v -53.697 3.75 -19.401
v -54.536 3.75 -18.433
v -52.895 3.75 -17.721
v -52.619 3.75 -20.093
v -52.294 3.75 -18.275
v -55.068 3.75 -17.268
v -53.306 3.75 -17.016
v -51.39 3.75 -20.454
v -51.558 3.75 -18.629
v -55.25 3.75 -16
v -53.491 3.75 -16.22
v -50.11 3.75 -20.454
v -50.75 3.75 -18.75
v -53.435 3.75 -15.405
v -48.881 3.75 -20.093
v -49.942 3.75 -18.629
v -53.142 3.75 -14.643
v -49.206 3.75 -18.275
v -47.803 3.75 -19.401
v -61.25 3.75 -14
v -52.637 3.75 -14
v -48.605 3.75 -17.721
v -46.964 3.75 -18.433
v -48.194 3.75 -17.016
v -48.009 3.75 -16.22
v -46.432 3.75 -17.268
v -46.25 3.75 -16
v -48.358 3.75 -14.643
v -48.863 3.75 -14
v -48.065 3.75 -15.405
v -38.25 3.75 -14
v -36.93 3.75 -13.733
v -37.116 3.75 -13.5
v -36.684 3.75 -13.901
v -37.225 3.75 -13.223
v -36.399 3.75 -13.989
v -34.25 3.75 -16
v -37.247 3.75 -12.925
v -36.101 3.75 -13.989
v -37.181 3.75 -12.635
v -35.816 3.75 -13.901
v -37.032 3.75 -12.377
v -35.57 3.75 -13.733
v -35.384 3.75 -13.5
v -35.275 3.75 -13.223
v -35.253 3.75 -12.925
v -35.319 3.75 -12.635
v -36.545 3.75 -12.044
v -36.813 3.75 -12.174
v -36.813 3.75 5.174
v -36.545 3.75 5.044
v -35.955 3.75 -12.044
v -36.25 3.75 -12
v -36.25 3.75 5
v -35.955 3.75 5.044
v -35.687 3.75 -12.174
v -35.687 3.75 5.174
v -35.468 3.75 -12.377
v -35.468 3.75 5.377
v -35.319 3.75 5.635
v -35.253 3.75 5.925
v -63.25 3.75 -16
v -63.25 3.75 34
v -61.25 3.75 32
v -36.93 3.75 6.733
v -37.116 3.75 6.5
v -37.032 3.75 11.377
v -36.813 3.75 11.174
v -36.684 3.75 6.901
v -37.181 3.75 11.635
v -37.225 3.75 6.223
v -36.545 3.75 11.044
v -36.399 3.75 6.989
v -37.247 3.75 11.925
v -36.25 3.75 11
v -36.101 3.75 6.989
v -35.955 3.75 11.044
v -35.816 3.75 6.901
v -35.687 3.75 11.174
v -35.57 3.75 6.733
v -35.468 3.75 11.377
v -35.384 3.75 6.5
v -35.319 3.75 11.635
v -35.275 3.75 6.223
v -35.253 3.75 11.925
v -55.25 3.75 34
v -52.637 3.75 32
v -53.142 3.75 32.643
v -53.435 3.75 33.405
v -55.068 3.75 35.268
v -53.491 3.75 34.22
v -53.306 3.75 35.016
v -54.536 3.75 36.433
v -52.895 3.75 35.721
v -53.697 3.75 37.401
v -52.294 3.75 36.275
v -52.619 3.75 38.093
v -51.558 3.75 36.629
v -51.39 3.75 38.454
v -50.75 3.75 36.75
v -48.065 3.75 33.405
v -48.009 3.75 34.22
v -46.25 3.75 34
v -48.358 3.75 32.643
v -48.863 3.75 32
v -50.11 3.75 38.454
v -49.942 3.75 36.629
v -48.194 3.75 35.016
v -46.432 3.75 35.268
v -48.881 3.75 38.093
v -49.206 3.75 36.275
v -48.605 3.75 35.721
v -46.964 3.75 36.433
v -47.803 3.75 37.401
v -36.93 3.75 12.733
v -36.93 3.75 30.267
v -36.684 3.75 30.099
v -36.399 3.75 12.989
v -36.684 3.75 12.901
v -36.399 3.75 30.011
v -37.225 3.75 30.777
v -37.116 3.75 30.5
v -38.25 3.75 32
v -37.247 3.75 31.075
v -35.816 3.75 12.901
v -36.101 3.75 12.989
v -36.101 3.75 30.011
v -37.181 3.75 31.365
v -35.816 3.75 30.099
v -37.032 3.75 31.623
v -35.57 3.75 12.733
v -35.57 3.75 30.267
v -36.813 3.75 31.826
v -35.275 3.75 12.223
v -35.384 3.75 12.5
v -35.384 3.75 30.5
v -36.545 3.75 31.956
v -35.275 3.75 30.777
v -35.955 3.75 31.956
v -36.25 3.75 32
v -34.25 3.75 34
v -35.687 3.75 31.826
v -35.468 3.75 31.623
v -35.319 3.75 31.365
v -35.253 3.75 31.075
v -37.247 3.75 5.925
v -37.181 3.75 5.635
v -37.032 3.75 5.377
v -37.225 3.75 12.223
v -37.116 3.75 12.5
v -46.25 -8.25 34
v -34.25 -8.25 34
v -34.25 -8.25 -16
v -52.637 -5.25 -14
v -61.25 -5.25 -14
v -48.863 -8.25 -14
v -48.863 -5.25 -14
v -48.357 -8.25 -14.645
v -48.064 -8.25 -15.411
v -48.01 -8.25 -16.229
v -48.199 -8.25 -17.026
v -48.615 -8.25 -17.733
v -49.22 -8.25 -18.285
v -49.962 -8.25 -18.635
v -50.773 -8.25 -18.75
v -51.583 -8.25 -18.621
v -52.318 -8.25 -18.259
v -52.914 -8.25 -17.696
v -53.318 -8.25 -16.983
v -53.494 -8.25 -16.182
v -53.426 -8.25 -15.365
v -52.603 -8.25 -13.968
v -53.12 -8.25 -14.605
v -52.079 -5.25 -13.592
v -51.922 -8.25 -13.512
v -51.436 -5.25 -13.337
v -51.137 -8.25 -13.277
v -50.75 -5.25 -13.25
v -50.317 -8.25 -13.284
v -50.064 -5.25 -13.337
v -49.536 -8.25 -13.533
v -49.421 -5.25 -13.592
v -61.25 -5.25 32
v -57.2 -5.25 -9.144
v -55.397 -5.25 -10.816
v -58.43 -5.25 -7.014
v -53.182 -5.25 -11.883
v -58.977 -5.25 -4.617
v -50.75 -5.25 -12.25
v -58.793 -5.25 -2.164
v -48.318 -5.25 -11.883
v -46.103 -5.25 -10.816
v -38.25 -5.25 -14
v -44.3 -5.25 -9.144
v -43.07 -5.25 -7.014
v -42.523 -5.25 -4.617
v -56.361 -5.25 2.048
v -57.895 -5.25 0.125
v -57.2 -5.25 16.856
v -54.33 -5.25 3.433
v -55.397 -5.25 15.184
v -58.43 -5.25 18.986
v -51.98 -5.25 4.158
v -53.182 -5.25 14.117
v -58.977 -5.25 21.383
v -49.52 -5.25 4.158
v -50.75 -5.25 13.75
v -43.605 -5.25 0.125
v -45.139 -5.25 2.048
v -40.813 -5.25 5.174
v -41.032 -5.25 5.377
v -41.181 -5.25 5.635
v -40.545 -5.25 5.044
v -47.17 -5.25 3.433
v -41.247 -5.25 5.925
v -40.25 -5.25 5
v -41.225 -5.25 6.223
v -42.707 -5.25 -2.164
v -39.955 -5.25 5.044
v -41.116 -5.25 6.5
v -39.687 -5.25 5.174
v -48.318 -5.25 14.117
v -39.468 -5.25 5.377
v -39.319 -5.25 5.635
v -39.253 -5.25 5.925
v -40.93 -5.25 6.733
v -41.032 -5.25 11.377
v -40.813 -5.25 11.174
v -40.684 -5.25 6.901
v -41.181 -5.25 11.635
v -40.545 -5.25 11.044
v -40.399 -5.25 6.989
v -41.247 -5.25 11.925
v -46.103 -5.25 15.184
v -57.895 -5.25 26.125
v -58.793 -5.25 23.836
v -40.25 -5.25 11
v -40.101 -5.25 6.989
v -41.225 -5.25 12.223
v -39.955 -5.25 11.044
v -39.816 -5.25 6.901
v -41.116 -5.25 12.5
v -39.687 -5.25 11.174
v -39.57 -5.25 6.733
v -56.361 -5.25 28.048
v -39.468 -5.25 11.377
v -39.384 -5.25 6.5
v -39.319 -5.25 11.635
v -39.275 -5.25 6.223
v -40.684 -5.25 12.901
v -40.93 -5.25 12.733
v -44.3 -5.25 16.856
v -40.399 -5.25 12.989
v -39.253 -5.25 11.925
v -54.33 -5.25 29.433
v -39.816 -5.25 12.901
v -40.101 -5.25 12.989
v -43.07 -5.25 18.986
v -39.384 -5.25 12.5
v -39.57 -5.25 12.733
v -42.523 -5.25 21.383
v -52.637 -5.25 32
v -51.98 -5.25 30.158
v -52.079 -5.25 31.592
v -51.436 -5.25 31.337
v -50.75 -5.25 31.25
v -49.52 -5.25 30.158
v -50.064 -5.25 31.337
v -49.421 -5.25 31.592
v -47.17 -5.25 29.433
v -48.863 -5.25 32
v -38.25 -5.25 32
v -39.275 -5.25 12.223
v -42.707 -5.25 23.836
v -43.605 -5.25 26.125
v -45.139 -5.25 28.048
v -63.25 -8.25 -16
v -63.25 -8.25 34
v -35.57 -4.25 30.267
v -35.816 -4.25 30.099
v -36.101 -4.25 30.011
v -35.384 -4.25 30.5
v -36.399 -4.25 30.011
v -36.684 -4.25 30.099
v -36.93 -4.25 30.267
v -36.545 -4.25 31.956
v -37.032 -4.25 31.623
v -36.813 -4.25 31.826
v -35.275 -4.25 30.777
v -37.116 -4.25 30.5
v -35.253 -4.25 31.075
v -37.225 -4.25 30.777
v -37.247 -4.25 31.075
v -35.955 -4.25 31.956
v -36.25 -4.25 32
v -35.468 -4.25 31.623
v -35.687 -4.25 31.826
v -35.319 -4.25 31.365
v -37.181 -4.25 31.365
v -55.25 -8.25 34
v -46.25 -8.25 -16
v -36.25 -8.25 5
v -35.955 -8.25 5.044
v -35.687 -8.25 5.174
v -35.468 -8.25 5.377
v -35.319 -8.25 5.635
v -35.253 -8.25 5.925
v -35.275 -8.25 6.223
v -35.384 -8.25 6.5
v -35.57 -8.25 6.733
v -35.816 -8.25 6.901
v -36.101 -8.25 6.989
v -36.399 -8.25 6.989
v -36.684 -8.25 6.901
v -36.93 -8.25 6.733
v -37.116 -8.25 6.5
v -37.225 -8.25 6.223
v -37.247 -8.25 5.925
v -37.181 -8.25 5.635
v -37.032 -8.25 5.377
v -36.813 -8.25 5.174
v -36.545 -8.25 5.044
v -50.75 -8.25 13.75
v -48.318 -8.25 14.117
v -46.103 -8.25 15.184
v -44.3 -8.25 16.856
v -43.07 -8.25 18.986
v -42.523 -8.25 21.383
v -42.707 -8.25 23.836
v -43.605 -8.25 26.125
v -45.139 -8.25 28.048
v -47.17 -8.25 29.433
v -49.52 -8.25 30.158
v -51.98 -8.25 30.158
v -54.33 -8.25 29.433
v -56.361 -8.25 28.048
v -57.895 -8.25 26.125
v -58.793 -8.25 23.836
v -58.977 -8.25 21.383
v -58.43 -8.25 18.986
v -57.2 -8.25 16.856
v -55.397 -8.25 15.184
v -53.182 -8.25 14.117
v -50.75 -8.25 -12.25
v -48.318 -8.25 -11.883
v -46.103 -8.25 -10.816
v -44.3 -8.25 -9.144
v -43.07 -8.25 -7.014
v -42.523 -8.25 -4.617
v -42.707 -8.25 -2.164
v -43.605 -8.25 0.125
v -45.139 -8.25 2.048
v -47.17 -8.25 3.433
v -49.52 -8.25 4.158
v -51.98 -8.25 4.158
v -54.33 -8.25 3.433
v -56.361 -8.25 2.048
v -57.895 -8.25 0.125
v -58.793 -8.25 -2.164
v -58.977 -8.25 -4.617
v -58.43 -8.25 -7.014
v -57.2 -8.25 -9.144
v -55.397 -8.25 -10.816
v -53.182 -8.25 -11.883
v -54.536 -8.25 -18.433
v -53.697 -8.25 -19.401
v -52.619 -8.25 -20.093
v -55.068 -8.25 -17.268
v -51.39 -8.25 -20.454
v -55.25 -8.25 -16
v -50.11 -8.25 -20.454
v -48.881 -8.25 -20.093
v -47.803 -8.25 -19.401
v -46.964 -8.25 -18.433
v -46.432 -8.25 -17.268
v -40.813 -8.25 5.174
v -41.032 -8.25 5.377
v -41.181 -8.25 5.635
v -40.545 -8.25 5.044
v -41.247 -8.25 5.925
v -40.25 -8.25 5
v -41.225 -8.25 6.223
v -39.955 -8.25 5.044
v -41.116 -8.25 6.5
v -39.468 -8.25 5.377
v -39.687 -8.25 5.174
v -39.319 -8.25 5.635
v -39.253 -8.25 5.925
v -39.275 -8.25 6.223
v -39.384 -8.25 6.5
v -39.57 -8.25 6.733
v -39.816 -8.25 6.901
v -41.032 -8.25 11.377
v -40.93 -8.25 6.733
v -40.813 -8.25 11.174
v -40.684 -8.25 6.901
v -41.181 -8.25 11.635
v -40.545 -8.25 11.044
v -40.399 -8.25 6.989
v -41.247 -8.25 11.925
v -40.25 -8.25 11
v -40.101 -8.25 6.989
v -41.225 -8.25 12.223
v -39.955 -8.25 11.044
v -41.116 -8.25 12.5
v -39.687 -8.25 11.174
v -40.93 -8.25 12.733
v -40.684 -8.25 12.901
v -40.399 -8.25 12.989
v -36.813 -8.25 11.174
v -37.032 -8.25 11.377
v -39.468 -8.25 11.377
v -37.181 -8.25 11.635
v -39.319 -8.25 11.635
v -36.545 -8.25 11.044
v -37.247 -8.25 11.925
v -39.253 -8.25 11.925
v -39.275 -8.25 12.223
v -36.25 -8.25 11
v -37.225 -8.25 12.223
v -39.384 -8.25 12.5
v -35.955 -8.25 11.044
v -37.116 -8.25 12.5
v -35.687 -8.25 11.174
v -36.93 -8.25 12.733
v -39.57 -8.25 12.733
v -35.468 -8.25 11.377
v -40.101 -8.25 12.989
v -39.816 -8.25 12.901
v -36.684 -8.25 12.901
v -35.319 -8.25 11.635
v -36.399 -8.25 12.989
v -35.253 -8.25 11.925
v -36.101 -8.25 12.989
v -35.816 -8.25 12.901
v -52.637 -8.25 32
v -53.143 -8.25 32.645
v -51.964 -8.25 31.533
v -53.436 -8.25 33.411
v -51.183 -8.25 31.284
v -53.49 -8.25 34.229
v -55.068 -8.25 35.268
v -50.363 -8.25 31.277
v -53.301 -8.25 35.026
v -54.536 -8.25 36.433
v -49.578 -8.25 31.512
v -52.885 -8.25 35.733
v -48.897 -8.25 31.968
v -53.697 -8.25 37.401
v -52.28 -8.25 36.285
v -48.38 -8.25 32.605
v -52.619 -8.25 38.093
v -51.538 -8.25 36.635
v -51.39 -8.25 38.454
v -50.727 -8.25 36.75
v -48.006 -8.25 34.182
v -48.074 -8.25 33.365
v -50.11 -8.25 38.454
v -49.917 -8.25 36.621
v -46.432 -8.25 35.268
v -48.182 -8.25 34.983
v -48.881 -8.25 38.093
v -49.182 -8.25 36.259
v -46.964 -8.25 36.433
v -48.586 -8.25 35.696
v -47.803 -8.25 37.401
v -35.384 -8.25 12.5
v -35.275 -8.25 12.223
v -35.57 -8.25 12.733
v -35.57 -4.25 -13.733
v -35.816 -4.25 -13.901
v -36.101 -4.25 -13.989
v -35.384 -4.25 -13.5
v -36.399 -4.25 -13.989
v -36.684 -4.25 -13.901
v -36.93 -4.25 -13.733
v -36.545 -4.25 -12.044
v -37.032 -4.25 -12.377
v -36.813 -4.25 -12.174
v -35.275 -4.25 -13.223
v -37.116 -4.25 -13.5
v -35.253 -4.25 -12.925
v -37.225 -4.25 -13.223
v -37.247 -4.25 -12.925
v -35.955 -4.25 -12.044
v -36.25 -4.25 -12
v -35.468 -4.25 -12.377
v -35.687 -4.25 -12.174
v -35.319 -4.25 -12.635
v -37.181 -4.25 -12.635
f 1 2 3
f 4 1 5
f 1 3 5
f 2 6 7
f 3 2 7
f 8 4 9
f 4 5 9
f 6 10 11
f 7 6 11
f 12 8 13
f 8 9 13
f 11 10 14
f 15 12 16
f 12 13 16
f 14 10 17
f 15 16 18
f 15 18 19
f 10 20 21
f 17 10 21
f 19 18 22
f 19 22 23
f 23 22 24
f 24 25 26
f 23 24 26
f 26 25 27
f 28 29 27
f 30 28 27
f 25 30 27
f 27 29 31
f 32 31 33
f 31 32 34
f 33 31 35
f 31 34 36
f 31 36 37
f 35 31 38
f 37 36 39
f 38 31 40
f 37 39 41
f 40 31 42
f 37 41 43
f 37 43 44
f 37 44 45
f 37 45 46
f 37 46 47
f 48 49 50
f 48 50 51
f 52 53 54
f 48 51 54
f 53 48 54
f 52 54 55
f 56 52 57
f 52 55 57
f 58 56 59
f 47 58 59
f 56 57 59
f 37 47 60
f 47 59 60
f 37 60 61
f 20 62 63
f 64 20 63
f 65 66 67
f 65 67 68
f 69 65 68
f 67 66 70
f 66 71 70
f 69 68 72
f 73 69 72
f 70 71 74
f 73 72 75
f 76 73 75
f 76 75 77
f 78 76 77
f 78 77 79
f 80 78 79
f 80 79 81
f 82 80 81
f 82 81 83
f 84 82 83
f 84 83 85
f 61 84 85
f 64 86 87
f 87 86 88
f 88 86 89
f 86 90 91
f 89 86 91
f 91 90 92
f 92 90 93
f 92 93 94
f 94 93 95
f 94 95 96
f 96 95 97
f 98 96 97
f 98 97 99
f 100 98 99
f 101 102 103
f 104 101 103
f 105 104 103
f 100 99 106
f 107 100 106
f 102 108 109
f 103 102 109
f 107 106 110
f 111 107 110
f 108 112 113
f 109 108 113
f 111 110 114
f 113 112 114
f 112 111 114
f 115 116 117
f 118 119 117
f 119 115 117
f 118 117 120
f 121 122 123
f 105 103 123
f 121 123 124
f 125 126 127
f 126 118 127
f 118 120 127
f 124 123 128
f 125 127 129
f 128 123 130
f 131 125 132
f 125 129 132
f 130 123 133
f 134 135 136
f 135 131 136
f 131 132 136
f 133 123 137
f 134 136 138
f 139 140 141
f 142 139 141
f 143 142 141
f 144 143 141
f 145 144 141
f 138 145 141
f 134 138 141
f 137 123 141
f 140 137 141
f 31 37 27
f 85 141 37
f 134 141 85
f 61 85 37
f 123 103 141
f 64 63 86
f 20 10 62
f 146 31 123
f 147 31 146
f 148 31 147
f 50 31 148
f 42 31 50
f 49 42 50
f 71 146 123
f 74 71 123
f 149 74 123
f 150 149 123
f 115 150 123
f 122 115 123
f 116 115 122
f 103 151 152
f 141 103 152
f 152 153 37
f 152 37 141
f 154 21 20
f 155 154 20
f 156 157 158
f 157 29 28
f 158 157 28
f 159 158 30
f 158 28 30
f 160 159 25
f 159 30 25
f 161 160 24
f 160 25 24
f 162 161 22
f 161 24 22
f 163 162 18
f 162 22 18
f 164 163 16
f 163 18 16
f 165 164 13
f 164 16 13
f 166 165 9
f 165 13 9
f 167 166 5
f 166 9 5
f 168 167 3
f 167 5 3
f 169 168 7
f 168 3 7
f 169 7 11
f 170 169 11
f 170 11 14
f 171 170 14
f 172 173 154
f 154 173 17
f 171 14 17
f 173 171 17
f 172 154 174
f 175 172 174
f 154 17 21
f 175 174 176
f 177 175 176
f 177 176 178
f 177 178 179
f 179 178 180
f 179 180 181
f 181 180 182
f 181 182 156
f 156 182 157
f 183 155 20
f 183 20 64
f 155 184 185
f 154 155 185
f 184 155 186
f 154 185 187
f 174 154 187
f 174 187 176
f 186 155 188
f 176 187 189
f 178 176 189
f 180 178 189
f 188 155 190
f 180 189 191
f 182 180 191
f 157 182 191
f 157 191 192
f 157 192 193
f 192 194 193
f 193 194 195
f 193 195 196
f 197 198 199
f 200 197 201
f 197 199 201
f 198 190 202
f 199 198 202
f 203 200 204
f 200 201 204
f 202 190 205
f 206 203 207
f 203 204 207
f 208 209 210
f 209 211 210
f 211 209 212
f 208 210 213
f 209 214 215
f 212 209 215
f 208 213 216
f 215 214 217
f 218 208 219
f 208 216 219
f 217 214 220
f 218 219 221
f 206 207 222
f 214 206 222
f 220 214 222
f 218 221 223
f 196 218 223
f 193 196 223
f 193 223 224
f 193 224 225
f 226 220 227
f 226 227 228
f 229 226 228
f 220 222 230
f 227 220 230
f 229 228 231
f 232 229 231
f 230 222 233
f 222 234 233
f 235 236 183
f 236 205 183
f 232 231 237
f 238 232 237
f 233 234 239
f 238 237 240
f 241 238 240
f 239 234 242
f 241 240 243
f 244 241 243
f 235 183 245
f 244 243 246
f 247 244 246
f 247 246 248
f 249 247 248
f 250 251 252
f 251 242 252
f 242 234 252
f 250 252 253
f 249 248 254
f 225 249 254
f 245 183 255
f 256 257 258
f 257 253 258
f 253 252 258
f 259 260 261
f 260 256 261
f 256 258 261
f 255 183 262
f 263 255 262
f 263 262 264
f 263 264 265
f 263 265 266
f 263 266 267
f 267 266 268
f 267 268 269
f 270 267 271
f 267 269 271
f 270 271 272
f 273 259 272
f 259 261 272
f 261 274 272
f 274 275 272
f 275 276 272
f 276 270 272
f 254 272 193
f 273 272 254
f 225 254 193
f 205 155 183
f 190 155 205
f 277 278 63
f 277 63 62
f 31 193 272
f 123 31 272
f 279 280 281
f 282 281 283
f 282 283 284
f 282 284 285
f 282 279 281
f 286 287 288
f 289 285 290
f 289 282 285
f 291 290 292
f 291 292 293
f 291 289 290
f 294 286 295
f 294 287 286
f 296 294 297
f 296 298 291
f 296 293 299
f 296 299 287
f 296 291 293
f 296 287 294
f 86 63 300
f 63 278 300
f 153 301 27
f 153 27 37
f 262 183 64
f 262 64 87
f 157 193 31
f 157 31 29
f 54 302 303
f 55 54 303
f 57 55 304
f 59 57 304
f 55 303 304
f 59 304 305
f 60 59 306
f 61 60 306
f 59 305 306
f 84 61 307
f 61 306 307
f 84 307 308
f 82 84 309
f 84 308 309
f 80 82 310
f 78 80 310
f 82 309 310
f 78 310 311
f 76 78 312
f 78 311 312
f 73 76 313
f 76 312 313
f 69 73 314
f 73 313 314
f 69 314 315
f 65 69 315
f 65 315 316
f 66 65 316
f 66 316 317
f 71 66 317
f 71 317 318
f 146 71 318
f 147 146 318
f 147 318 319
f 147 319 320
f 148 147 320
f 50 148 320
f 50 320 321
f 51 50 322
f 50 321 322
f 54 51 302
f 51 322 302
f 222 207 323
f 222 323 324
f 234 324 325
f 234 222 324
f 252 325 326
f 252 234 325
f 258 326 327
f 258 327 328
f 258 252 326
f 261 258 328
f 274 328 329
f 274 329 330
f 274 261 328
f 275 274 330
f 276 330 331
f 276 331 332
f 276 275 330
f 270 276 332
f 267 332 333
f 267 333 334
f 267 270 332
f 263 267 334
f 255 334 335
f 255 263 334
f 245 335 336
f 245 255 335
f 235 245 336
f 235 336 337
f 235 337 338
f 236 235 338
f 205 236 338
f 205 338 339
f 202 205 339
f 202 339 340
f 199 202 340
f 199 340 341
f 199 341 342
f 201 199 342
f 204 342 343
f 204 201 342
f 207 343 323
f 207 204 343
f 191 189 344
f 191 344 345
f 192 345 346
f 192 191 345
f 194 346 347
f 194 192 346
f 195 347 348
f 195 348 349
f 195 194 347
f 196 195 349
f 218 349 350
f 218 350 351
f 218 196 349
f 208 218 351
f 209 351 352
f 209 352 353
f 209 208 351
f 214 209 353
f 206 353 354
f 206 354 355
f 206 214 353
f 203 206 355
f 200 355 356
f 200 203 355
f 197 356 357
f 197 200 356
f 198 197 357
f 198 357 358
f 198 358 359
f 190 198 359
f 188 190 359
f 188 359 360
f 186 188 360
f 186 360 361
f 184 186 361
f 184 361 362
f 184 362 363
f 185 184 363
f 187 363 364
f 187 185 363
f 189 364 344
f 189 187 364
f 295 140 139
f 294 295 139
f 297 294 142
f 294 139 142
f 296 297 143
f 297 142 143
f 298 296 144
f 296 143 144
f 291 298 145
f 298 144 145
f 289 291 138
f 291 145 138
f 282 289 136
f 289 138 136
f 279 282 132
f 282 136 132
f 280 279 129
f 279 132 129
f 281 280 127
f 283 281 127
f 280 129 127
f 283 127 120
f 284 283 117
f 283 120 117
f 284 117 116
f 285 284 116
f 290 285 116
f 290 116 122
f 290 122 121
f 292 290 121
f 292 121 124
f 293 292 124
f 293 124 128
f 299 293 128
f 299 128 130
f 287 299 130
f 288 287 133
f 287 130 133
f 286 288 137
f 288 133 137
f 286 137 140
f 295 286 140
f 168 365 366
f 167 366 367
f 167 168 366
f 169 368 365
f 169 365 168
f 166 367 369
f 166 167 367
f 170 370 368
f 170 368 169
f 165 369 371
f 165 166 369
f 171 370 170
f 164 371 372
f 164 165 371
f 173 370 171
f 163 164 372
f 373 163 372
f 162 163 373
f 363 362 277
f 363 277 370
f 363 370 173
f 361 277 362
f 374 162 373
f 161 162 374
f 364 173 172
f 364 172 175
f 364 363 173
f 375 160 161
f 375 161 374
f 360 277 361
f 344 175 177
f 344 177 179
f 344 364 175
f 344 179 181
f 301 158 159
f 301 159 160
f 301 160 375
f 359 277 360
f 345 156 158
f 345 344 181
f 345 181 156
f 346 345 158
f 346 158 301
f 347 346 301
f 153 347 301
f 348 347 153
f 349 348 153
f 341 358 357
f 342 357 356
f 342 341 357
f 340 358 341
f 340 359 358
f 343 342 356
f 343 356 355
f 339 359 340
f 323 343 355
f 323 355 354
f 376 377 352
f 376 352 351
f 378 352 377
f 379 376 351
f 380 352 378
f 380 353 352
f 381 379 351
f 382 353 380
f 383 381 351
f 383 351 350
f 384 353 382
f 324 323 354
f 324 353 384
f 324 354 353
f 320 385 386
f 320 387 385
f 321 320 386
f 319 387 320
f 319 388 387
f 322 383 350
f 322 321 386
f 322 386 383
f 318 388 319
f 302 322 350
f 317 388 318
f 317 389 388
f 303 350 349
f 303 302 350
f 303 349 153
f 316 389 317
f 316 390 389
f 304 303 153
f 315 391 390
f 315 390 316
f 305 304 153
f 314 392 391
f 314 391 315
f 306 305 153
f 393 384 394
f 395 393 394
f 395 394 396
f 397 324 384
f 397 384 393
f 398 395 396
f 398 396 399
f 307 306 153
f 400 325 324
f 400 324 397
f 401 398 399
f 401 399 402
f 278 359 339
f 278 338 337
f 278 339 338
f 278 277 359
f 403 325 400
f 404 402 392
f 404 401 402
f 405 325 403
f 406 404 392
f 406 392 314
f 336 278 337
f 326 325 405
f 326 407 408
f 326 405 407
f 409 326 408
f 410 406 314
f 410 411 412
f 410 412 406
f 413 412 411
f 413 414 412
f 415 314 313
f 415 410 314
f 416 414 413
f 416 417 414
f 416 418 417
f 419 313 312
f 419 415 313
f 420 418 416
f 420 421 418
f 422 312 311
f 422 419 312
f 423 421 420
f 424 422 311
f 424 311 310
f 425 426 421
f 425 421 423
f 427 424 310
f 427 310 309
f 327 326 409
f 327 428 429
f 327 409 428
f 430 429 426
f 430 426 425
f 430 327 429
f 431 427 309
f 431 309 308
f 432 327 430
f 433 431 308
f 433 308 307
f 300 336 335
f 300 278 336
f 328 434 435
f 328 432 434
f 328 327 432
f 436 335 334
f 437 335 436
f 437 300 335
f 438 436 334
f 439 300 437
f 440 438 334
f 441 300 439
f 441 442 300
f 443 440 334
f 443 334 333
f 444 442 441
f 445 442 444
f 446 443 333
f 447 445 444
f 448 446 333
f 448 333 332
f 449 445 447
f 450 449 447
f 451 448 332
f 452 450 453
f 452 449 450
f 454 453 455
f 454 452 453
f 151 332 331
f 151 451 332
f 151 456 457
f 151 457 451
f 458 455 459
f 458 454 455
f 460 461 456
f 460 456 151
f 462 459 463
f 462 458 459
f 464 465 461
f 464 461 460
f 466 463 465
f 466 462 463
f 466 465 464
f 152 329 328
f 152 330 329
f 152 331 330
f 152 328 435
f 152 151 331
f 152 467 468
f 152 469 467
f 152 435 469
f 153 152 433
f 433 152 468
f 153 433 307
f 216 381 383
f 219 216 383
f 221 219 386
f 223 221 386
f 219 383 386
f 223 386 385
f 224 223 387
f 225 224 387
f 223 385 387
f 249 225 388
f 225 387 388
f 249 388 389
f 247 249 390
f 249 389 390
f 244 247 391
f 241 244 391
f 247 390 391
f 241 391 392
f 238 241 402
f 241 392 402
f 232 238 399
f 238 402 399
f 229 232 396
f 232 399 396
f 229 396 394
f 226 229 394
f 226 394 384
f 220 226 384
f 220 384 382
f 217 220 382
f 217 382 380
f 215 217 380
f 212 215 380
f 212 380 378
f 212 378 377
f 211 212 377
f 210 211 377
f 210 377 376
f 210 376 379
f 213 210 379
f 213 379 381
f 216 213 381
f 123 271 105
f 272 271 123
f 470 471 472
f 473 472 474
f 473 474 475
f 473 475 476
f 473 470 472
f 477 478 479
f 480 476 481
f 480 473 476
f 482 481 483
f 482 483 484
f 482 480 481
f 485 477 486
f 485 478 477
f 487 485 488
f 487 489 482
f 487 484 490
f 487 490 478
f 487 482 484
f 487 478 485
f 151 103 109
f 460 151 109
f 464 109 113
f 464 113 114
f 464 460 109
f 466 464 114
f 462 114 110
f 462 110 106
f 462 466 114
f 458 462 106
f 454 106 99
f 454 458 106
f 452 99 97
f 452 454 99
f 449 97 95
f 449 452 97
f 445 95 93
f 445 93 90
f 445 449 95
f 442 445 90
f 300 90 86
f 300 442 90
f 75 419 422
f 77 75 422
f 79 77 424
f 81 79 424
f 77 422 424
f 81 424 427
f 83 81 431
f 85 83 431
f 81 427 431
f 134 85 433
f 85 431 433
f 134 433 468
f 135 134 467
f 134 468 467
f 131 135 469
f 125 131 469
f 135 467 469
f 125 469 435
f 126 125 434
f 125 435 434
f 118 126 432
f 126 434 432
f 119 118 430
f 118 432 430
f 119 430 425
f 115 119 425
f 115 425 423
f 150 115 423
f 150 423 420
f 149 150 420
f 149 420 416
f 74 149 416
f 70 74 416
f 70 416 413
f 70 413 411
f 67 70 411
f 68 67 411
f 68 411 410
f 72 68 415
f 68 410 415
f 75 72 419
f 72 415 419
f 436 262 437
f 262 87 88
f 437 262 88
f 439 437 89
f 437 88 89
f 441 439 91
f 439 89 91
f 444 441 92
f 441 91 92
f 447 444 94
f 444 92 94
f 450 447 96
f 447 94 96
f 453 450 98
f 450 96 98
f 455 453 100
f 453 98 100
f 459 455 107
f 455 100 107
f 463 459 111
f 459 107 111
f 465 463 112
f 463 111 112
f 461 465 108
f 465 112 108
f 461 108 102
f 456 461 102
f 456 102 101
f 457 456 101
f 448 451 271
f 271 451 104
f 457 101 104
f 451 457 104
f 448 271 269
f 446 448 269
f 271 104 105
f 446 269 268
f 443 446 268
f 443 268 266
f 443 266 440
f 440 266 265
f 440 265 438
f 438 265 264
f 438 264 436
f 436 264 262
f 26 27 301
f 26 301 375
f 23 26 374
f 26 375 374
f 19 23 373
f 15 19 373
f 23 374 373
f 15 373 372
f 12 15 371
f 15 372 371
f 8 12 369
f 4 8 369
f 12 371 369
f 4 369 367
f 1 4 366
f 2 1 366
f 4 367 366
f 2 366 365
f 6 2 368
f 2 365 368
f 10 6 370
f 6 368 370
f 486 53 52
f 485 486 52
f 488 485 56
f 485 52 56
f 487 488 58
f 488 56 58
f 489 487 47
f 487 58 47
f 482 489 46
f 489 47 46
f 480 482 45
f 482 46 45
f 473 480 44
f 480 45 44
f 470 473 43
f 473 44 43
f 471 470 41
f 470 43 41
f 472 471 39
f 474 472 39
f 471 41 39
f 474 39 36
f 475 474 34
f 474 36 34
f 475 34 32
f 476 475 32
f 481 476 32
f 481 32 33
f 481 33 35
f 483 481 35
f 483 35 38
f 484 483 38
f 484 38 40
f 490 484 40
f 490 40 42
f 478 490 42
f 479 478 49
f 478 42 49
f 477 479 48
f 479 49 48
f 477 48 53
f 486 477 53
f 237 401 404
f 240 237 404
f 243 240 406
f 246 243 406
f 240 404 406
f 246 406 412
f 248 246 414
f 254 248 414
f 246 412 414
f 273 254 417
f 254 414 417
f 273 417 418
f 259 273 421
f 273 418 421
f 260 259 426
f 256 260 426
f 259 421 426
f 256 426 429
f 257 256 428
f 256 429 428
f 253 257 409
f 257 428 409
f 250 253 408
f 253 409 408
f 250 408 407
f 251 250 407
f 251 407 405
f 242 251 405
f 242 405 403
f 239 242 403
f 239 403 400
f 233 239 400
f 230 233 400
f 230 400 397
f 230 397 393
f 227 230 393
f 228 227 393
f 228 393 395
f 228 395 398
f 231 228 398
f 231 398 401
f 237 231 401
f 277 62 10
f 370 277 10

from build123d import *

# Parameters (mm, degrees)
BOSS_EXTRUDE1_DEPTH      = 2
BOSS_EXTRUDE2_DEPTH      = 1
SKETCH3_R                = 1
CUT_EXTRUDE1_DEPTH       = 1
BOSS_EXTRUDE3_DEPTH      = 2
BOSS_EXTRUDE3_DEPTH_BACK = 1
BOSS_EXTRUDE4_START      = -3
BOSS_EXTRUDE4_OUTLINE_R  = 1
BOSS_EXTRUDE4_DEPTH      = 3
SKETCH6_R                = 3.500627768
BOSS_EXTRUDE5_DEPTH      = 3
BOSS_EXTRUDE6_DEPTH      = 3
CUT_EXTRUDE2_DEPTH       = 15
FILLET1_R                = 20
FILLET2_R                = 3
FILLET3_R                = 3
SKETCH9_R                = 1
CUT_EXTRUDE3_DEPTH       = 15
CUT_EXTRUDE4_DEPTH       = 1.5
FILLET4_R                = 8
FILLET5_R                = 2
SKETCH11_W               = 110.258684369
SKETCH11_H               = 6.064888907
CUT_EXTRUDE5_DEPTH       = 38
SKETCH12_R               = 18.613151801
CUT_EXTRUDE6_DEPTH       = 29
SKETCH13_W               = 77.706478895
SKETCH13_H               = 41.021519778
CUT_EXTRUDE7_DEPTH       = 1
FILLET6_START            = -4.447684996
FILLET6_DEPTH            = 2
FILLET6_START_2          = 2.447684996
FILLET6_2_DEPTH          = 2
FILLET6_START_3          = -1
FILLET6_3_DEPTH          = 1
FILLET6_START_4          = -2.447684996
FILLET6_4_DEPTH          = 4.895369992
CUT_EXTRUDE8_DEPTH       = 37
CUT_EXTRUDE8_DEPTH_BACK  = 10
SKETCH14_W               = 81.474605317
SKETCH14_H               = 77.503756956
BOSS_EXTRUDE7_DEPTH      = 2
BOSS_EXTRUDE7_DEPTH_BACK = 1
BOSS_EXTRUDE8_DEPTH      = 8
BOSS_EXTRUDE8_DEPTH_BACK = 3
SKETCH16_W               = 2
SKETCH16_H               = 10.5
BOSS_EXTRUDE9_DEPTH      = 10.5
FILLET7_R                = 10
SKETCH18_W               = 1.521986252
SKETCH18_H               = 3
BOSS_EXTRUDE10_DEPTH     = 10.5
FILLET8_R                = 2
SKETCH19_W               = 25
SKETCH19_H               = 2
BOSS_EXTRUDE11_DEPTH     = 10.5
SKETCH20_W               = 4
SKETCH20_H               = 10
SKETCH20_R               = 1
BOSS_EXTRUDE12_DEPTH     = 5
FILLET9_R                = 2
FILLET10_R               = 2
FILLET11_R               = 2
SKETCH21_R               = 8.25
BOSS_EXTRUDE13_DEPTH     = 3
BOSS_EXTRUDE14_START     = 3
SKETCH23_W               = 4
SKETCH23_H               = 10
SKETCH23_R               = 1
BOSS_EXTRUDE14_DEPTH     = 3
SKETCH25_R               = 50.400338574
CUT_EXTRUDE9_DEPTH       = 20
BOSS_EXTRUDE15_DEPTH     = 12
SKETCH27_W               = 4
SKETCH27_H               = 50
SKETCH27_R               = 1
BOSS_EXTRUDE16_DEPTH     = 12
SKETCH28_R               = 2.5
CUT_EXTRUDE10_DEPTH      = 18
BOSS_EXTRUDE17_DEPTH     = 12
SKETCH30_R               = 2.75
CUT_EXTRUDE11_DEPTH      = 18
SKETCH31_R               = 1
CUT_EXTRUDE12_DEPTH      = 8


with BuildPart() as part:
    # Sketch1 → Boss-Extrude1 (new body)
    with BuildSketch(Plane.XY):
        with BuildLine():
            Line((14.458185053, 3.677415528), (0.579181495, 5.217954465))
            ThreePointArc((0.579181495, 5.217954465), (-5.25, 0), (0.579181495, -5.217954465))
            Line((0.579181495, -5.217954465), (14.458185053, -3.677415528))
            ThreePointArc((14.458185053, -3.677415528), (17.75, 0), (14.458185053, 3.677415528))
        make_face()
        with BuildLine():
            Line((14.292704626, 2.186571395), (0.413701068, 3.727110332))
            ThreePointArc((0.413701068, 3.727110332), (-3.75, 0), (0.413701068, -3.727110332))
            Line((0.413701068, -3.727110332), (14.292704626, -2.186571395))
            ThreePointArc((14.292704626, -2.186571395), (16.25, 0), (14.292704626, 2.186571395))
        make_face(mode=Mode.SUBTRACT)
    extrude(amount=BOSS_EXTRUDE1_DEPTH)

    # Sketch2 → Boss-Extrude2 (add)
    with BuildSketch(Plane.XY.offset(2)):
        with BuildLine():
            Line((14.458185053, 3.677415528), (0.579181495, 5.217954465))
            ThreePointArc((0.579181495, 5.217954465), (-5.25, 0), (0.579181495, -5.217954465))
            Line((0.579181495, -5.217954465), (14.458185053, -3.677415528))
            ThreePointArc((14.458185053, -3.677415528), (17.75, 0), (14.458185053, 3.677415528))
        make_face()
    extrude(amount=BOSS_EXTRUDE2_DEPTH)

    # Sketch3 → Cut-Extrude1 (cut)
    with BuildSketch(Plane.XY.offset(3)):
        Circle(SKETCH3_R)
    extrude(amount=-CUT_EXTRUDE1_DEPTH, mode=Mode.SUBTRACT)

    # Sketch4 → Boss-Extrude3 (add, two sides: drawn at the far end of the back side and taken through both)
    with BuildSketch(Plane(origin=(0, 0, 2), x_dir=(-1, 0, 0), z_dir=(0, 0, -1)).offset(-BOSS_EXTRUDE3_DEPTH_BACK)):
        with BuildLine():
            Line((-15.26072202, 2.426182253), (-7.518683274, 4.447684996))
            Line((-7.518683274, 4.447684996), (-42.518683274, 4.447684996))
            ThreePointArc((-42.518683274, 4.447684996), (-39.373695053, 3.144988221), (-38.070998278, 0))
            ThreePointArc((-38.070998278, 0), (-39.373695053, -3.144988221), (-42.518683274, -4.447684996))
            Line((-42.518683274, -4.447684996), (-7.518683274, -4.447684996))
            Line((-7.518683274, -4.447684996), (-13.862339481, -2.595687971))
            Line((-13.862339481, -2.595687971), (-16.213670101, -1.84565397))
            Line((-16.213670101, -1.84565397), (-17.166618181, 0))
            Line((-17.166618181, 0), (-15.26072202, 2.426182253))
        make_face()
        with BuildLine():
            ThreePointArc((-38.070998278, 0), (-39.373695053, 3.144988221), (-42.518683274, 4.447684996))
            Line((-42.518683274, 4.447684996), (-42.518683274, 2))
            ThreePointArc((-42.518683274, 2), (-41.104469712, 1.414213562), (-40.518683274, 0))
            ThreePointArc((-40.518683274, 0), (-41.104469712, -1.414213562), (-42.518683274, -2))
            Line((-42.518683274, -2), (-42.518683274, -4.447684996))
            ThreePointArc((-42.518683274, -4.447684996), (-39.373695053, -3.144988221), (-38.070998278, 0))
        make_face()
        with BuildLine():
            Line((-42.518683274, 2), (-42.518683274, 4.447684996))
            ThreePointArc((-42.518683274, 4.447684996), (-46.96636827, 0), (-42.518683274, -4.447684996))
            Line((-42.518683274, -4.447684996), (-42.518683274, -2))
            ThreePointArc((-42.518683274, -2), (-44.518683274, 0), (-42.518683274, 2))
        make_face()
    extrude(amount=BOSS_EXTRUDE3_DEPTH + BOSS_EXTRUDE3_DEPTH_BACK)

    # Boss-Extrude4: read off the stored shape, not the designer's step
    # Boss-Extrude4 outline → Boss-Extrude4 (add)
    with BuildSketch(Plane(origin=(0, 0, 0), x_dir=(-1, 0, 0), z_dir=(0, 0, -1)).offset(BOSS_EXTRUDE4_START)):
        with BuildLine():
            ThreePointArc((-42.518683274, -4.447684996), (-46.96636827, 0), (-42.518683274, 4.447684996))
            Line((-42.518683274, 4.447684996), (-54.290526798, 4.447684996))
            ThreePointArc((-54.290526798, 4.447684996), (-59.289068337, 5.305033813), (-63.716210719, 7.779073998))
            ThreePointArc((-63.716210719, 7.779073998), (-80, 0), (-63.716210719, -7.779073998))
            ThreePointArc((-63.716210719, -7.779073998), (-59.289068337, -5.305033813), (-54.290526798, -4.447684996))
            Line((-54.290526798, -4.447684996), (-42.518683274, -4.447684996))
        make_face()
        with Locations((-68.205771366, -4.5)):
            Circle(BOSS_EXTRUDE4_OUTLINE_R, mode=Mode.SUBTRACT)
        with Locations((-76, 0)):
            Circle(BOSS_EXTRUDE4_OUTLINE_R, mode=Mode.SUBTRACT)
        with Locations((-68.205771366, 4.5)):
            Circle(BOSS_EXTRUDE4_OUTLINE_R, mode=Mode.SUBTRACT)
    extrude(amount=BOSS_EXTRUDE4_DEPTH)

    # Sketch6 → Boss-Extrude5 (add)
    with BuildSketch(Plane(origin=(0, 0, 0), x_dir=(-1, 0, 0), z_dir=(0, 0, -1))):
        with Locations((-42.518683274, 0)):
            Circle(SKETCH6_R)
    extrude(amount=-BOSS_EXTRUDE5_DEPTH)

    # Sketch7 → Boss-Extrude6 (add)
    with BuildSketch(Plane(origin=(0, 0, 0), x_dir=(-1, 0, 0), z_dir=(0, 0, -1))):
        Polygon((-54.290526798, 4.447684996), (-94.290526798, 4.447684996), (-94.290526798, -3.552315004), (-68.73970048, -3.552315004), (-92.931542949, -17.519481766), (-88.931542949, -24.447684996), (-54.290526798, -4.447684996), align=None)
    extrude(amount=-BOSS_EXTRUDE6_DEPTH)

    # Sketch8 → Cut-Extrude2 (cut)
    with BuildSketch(Plane(origin=(0, 0, 0), x_dir=(-1, 0, 0), z_dir=(0, 0, -1))):
        Polygon((-94.290526798, 4.447684996), (-45.837456427, 4.447684996), (-68.326886593, 15.265325323), align=None)
        Polygon((-94.290526798, -3.552315004), (-68.73970048, -3.552315004), (-92.931542949, -17.519481766), align=None)
    extrude(amount=-CUT_EXTRUDE2_DEPTH, mode=Mode.SUBTRACT)

    # Fillet1
    fillet1_edges = [part.edges().sort_by_distance(p)[0] for p in [
        (54.290526798, -4.447684996, 1.5),
    ]]
    fillet(fillet1_edges, radius=FILLET1_R)

    # Fillet2
    fillet2_edges = [part.edges().sort_by_distance(p)[0] for p in [
        (94.290526798, 4.447684996, 1.5),
        (94.290526798, -3.552315004, 1.5),
        (92.931542949, -17.519481766, 1.5),
        (88.931542949, -24.447684996, 1.5),
    ]]
    fillet(fillet2_edges, radius=FILLET2_R)

    # Fillet3
    fillet3_edges = [part.edges().sort_by_distance(p)[0] for p in [
        (68.73970048, -3.552315004, 1.5),
    ]]
    fillet(fillet3_edges, radius=FILLET3_R)

    # Sketch9 → Cut-Extrude3 (cut)
    with BuildSketch(Plane(origin=(0, 0, 0), x_dir=(-1, 0, 0), z_dir=(0, 0, -1))):
        with Locations((-89.290526798, 0.447684996)):
            Circle(SKETCH9_R)
        with Locations((-79.290526798, 0.447684996)):
            Circle(SKETCH9_R)
        with Locations((-77.941161892, -13.483583381)):
            Circle(SKETCH9_R)
        with Locations((-86.60141593, -18.483583381)):
            Circle(SKETCH9_R)
    extrude(amount=-CUT_EXTRUDE3_DEPTH, mode=Mode.SUBTRACT)

    # Sketch10 → Cut-Extrude4 (cut)
    with BuildSketch(Plane(origin=(0, 0, 0), x_dir=(-1, 0, 0), z_dir=(0, 0, -1))):
        with BuildLine():
            Line((-19.05, 2.447684996), (-67.154630008, 2.447684996))
            ThreePointArc((-67.154630008, 2.447684996), (-70.616179326, -5.909234314), (-62.259260015, -2.447684996))
            Line((-62.259260015, -2.447684996), (-19.05, -2.447684996))
            Line((-19.05, -2.447684996), (-19.05, 2.447684996))
        make_face()
    extrude(amount=-CUT_EXTRUDE4_DEPTH, mode=Mode.SUBTRACT)

    # Fillet4
    fillet4_edges = [part.edges().sort_by_distance(p)[0] for p in [
        (62.259260015, -2.447684996, 0.75),
    ]]
    fillet(fillet4_edges, radius=FILLET4_R)

    # Fillet5
    fillet5_edges = [part.edges().sort_by_distance(p)[0] for p in [
        (19.05, 2.447684996, 0.75),
        (19.05, -2.447684996, 0.75),
    ]]
    fillet(fillet5_edges, radius=FILLET5_R)

    # Mirror1: part across plane


with BuildPart() as part_1:
    add(part.part)
    add(part.part.mirror(Plane(origin=(14.05, 0, 0), x_dir=(1, 0, 0), z_dir=(0, 0, 1))))

    # Sketch11 → Cut-Extrude5 (cut)
    with BuildSketch(Plane(origin=(0, 4.447684996, 0), x_dir=(1, 0, 0), z_dir=(0, 1, 0))):
        with Locations((47.771534573, -3.032444454)):
            Rectangle(SKETCH11_W, SKETCH11_H)
    extrude(amount=-CUT_EXTRUDE5_DEPTH, mode=Mode.SUBTRACT)

    # Sketch12 → Cut-Extrude6 (cut)
    with BuildSketch(Plane.XY):
        with Locations((7.534351793, 3.599902348)):
            Circle(SKETCH12_R)
    extrude(amount=CUT_EXTRUDE6_DEPTH, mode=Mode.SUBTRACT)

    # Sketch13 → Cut-Extrude7 (cut)
    with BuildSketch(Plane.XY):
        with Locations((57.903239447, -8.718962854)):
            Rectangle(SKETCH13_W, SKETCH13_H)
    extrude(amount=-CUT_EXTRUDE7_DEPTH, mode=Mode.SUBTRACT)

    # Fillet6: read off the stored shape, not the designer's step
    # Fillet6 outline → Fillet6 (add)
    with BuildSketch(Plane(origin=(0, 0, 0), x_dir=(1, 0, 0), z_dir=(0, 1, 0)).offset(FILLET6_START)):
        with BuildLine():
            Line((19.05, 1), (19.049997006, -1.45e-06))
            ThreePointArc((19.049997006, -1.45e-06), (21.172829345, 0.746793973), (23.408898944, 1))
            Line((23.408898944, 1), (19.05, 1))
        make_face()
    extrude(amount=FILLET6_DEPTH)

    # Fillet6 2 outline → Fillet6 2 (add)
    with BuildSketch(Plane(origin=(0, 0, 0), x_dir=(1, 0, 0), z_dir=(0, 1, 0)).offset(FILLET6_START_2)):
        with BuildLine():
            Line((19.05, 1), (19.049997006, -1.45e-06))
            ThreePointArc((19.049997006, -1.45e-06), (21.172829345, 0.746793973), (23.408898944, 1))
            Line((23.408898944, 1), (19.05, 1))
        make_face()
    extrude(amount=FILLET6_2_DEPTH)

    # Fillet6 3 outline → Fillet6 3 (add)
    with BuildSketch(Plane.XY.offset(FILLET6_START_3)):
        with BuildLine():
            Line((19.05, 2.447684996), (19.05, 0.447684996))
            ThreePointArc((19.05, 0.447684996), (19.635786438, 1.861898559), (21.05, 2.447684996))
            Line((21.05, 2.447684996), (19.05, 2.447684996))
        make_face()
        with BuildLine():
            ThreePointArc((21.05, -2.447684996), (19.635786438, -1.861898559), (19.05, -0.447684996))
            Line((19.05, -0.447684996), (19.05, -2.447684996))
            Line((19.05, -2.447684996), (21.05, -2.447684996))
        make_face()
    extrude(amount=FILLET6_3_DEPTH)

    # Fillet6 4 outline → Fillet6 4 (cut)
    with BuildSketch(Plane(origin=(0, 0, 0), x_dir=(1, 0, 0), z_dir=(0, 1, 0)).offset(FILLET6_START_4)):
        with BuildLine():
            ThreePointArc((23, 0.991636585), (20.973982557, 0.699029961), (19.049997006, -1.45e-06))
            Line((19.049997006, -1.45e-06), (18, -0.508538641))
            Line((18, -0.508538641), (18, -1))
            Line((18, -1), (23, -1))
            Line((23, -1), (23, 0.991636585))
        make_face()
    extrude(amount=FILLET6_4_DEPTH, mode=Mode.SUBTRACT)

    # Sketch14 → Cut-Extrude8 (cut, two sides: drawn at the far end of the back side and taken through both)
    with BuildSketch(Plane.XY.offset(-2).offset(-CUT_EXTRUDE8_DEPTH_BACK)):
        with Locations((59.787302659, 4.447684996)):
            Rectangle(SKETCH14_W, SKETCH14_H)
    extrude(amount=CUT_EXTRUDE8_DEPTH + CUT_EXTRUDE8_DEPTH_BACK, mode=Mode.SUBTRACT)

    # Sketch15 → Boss-Extrude7 (add, two sides: drawn at the far end of the back side and taken through both)
    with BuildSketch(Plane.XY.offset(-2).offset(-BOSS_EXTRUDE7_DEPTH_BACK)):
        Polygon((0, 4.349044766), (-3.638836396, 3.035019198), (-4.3304288, -1.298959868), (-2.356179656, -4.022923876), (0, -4.398909991), (0, -5.25), (-7.25, -5.25), (-7.25, 5.25), (0, 5.25), align=None)
    extrude(amount=BOSS_EXTRUDE7_DEPTH + BOSS_EXTRUDE7_DEPTH_BACK)



with BuildPart() as body_2:
    # Sketch16 → Boss-Extrude8 (new, two sides: drawn at the far end of the back side and taken through both)
    with BuildSketch(Plane.XY.offset(-BOSS_EXTRUDE8_DEPTH_BACK)):
        with Locations((-8.25, 0)):
            Rectangle(SKETCH16_W, SKETCH16_H)
    extrude(amount=BOSS_EXTRUDE8_DEPTH + BOSS_EXTRUDE8_DEPTH_BACK)

    # Sketch17 → Boss-Extrude9 (add)
    with BuildSketch(Plane.XZ.offset(5.25)):
        Polygon((-9.25, 8), (-13.25, 10), (-13.25, 8), (-9.25, 6), align=None)
    extrude(amount=-BOSS_EXTRUDE9_DEPTH)

    # Fillet7
    # the kernel refuses this fillet: 10 mm, written as the material it adds along each edge
    with BuildSketch(Plane(origin=(-9.25, -5.25, 6), x_dir=(0, 0, -1), z_dir=(0, 1, 0))) as fillet7_piece_1:
        with BuildLine():
            CenterArc((6, 10), FILLET7_R, 216.869897646, 53.130102354)
            Line((-2, 4), (-2.16, 3.88))
            ThreePointArc((-2.16, 3.88), (-1.178885438, 1.910557281), (-0.178885438, -0.089442719))
            Line((-0.178885438, -0.089442719), (0, -0.2))
            Line((0, -0.2), (6, -0.2))
            Line((6, -0.2), (6, 0))
        make_face()
    extrude(amount=10.5)


with BuildPart() as part_2:
    add(part_1.part)

    add(body_2.part)  # Boss-Extrude10 merges body 2
    # Sketch18 → Boss-Extrude10 (add)
    with BuildSketch(Plane.XZ.offset(5.25)):
        with Locations((-7.358034117, -1.5)):
            Rectangle(SKETCH18_W, SKETCH18_H)
    extrude(amount=-BOSS_EXTRUDE10_DEPTH)

    # Fillet8
    fillet8_edges = [part_2.edges().sort_by_distance(p)[0] for p in [
        (-7.25, 0, 0),
    ]]
    fillet(fillet8_edges, radius=FILLET8_R)

    # Sketch19 → Boss-Extrude11 (add)
    with BuildSketch(Plane.XZ.offset(5.25)):
        with Locations((-25.75, 9)):
            Rectangle(SKETCH19_W, SKETCH19_H)
    extrude(amount=-BOSS_EXTRUDE11_DEPTH)

    # Sketch20 → Boss-Extrude12 (add)
    with BuildSketch(Plane.XZ.offset(5.25)):
        with Locations((-40.25, 9)):
            Rectangle(SKETCH20_W, SKETCH20_H)
        with Locations(Location((-40.25, 6, 0), (0, 0, 270))):
            Circle(SKETCH20_R, mode=Mode.SUBTRACT)
        with Locations(Location((-40.25, 12, 0), (0, 0, 270))):
            Circle(SKETCH20_R, mode=Mode.SUBTRACT)
    extrude(amount=-BOSS_EXTRUDE12_DEPTH)

    # Fillet9
    fillet9_edges = [part_2.edges().sort_by_distance(p)[0] for p in [
        (-38.25, -2.75, 10),
        (-38.25, -2.75, 8),
    ]]
    fillet(fillet9_edges, radius=FILLET9_R)

    # Fillet10
    fillet10_edges = [part_2.edges().sort_by_distance(p)[0] for p in [
        (-7.25, 0, 8),
    ]]
    fillet(fillet10_edges, radius=FILLET10_R - 0.0001)  # a hair under: the kernel refuses the full size

    # Fillet11
    fillet11_edges = [part_2.edges().sort_by_distance(p)[0] for p in [
        (19.05, 4.447684996, -1.5),
        (19.05, -4.447684996, -1.5),
    ]]
    fillet(fillet11_edges, radius=FILLET11_R - 0.0001)  # a hair under: the kernel refuses the full size



with BuildPart() as body_2_2:
    # Sketch21 → Boss-Extrude13 (new body)
    with BuildSketch(Plane.XZ.offset(5.25)):
        Polygon((-38.25, 14), (-38.25, 34), (-63.25, 34), (-63.25, 9), (-63.25, -16), (-38.25, -16), (-38.25, 4), (-42.25, 4), (-42.25, 14), align=None)
        with Locations(Location((-50.75, -4, 0), (0, 0, 270))):
            Circle(SKETCH21_R, mode=Mode.SUBTRACT)
        with Locations(Location((-50.75, 22, 0), (0, 0, 270))):
            Circle(SKETCH21_R, mode=Mode.SUBTRACT)
    extrude(amount=BOSS_EXTRUDE13_DEPTH)


with BuildPart() as part_3:
    add(part_2.part)

    add(body_2_2.part)  # Boss-Extrude14 merges body 2 2
    # Sketch23 → Boss-Extrude14 (add)
    with BuildSketch(Plane.XZ.offset(5.25).offset(BOSS_EXTRUDE14_START)):
        with Locations((-40.25, 9)):
            Rectangle(SKETCH23_W, SKETCH23_H)
        with Locations(Location((-40.25, 6, 0), (0, 0, 270))):
            Circle(SKETCH23_R, mode=Mode.SUBTRACT)
        with Locations(Location((-40.25, 12, 0), (0, 0, 270))):
            Circle(SKETCH23_R, mode=Mode.SUBTRACT)
    extrude(amount=-BOSS_EXTRUDE14_DEPTH)

    # Sketch25 → Cut-Extrude9 (cut)
    with BuildSketch(Plane(origin=(0, -5.25, 0), x_dir=(1, 0, 0), z_dir=(0, 1, 0))):
        with Locations((-22.018232387, -10)):
            Circle(SKETCH25_R)
    extrude(amount=CUT_EXTRUDE9_DEPTH, mode=Mode.SUBTRACT)

    # Sketch26 → Boss-Extrude15 (add)
    with BuildSketch(Plane.XZ.offset(8.25)):
        Polygon((-38.25, 34), (-63.25, 34), (-63.25, -16), (-38.25, -16), (-38.25, -14), (-61.25, -14), (-61.25, 32), (-38.25, 32), align=None)
    extrude(amount=-BOSS_EXTRUDE15_DEPTH)

    # Sketch27 → Boss-Extrude16 (add)
    with BuildSketch(Plane.XZ.offset(8.25)):
        with Locations((-36.25, 9)):
            Rectangle(SKETCH27_W, SKETCH27_H)
        with Locations(Location((-36.25, 6, 0), (0, 0, 270))):
            Circle(SKETCH27_R, mode=Mode.SUBTRACT)
        with Locations(Location((-36.25, 12, 0), (0, 0, 270))):
            Circle(SKETCH27_R, mode=Mode.SUBTRACT)
    extrude(amount=-BOSS_EXTRUDE16_DEPTH)

    # Sketch28 → Cut-Extrude10 (cut)
    with BuildSketch(Plane.XZ.offset(8.25)):
        with Locations((-50.75, -16)):
            Circle(SKETCH28_R)
        with Locations((-50.75, 34)):
            Circle(SKETCH28_R)
    extrude(amount=-CUT_EXTRUDE10_DEPTH, mode=Mode.SUBTRACT)

    # Sketch29 → Boss-Extrude17 (add)
    with BuildSketch(Plane.XZ.offset(8.25)):
        with BuildLine():
            Line((-55.239729053, -15.696136494), (-53.176562378, -15.398506004))
            ThreePointArc((-53.176562378, -15.398506004), (-50.75, -18.5), (-48.323437622, -15.398506004))
            Line((-48.323437622, -15.398506004), (-46.290380625, -15.398506004))
            ThreePointArc((-46.290380625, -15.398506004), (-50.600425185, -20.497513466), (-55.239729053, -15.696136494))
        make_face()
        with BuildLine():
            Line((-55.239729053, 33.696136494), (-53.231464682, 33.696136494))
            ThreePointArc((-53.231464682, 33.696136494), (-50.75, 36.5), (-48.268535318, 33.696136494))
            Line((-48.268535318, 33.696136494), (-46.283363572, 33.453045689))
            ThreePointArc((-46.283363572, 33.453045689), (-50.627907403, 38.498343406), (-55.239729053, 33.696136494))
        make_face()
    extrude(amount=-BOSS_EXTRUDE17_DEPTH)

    # Sketch30 → Cut-Extrude11 (cut)
    with BuildSketch(Plane(origin=(0, 3.75, 0), x_dir=(1, 0, 0), z_dir=(0, 1, 0))):
        with Locations(Location((-50.75, 16, 0), (0, 0, 313.341758227))):
            Circle(SKETCH30_R)
        with Locations(Location((-50.75, -34, 0), (0, 0, 133.341758227))):
            Circle(SKETCH30_R)
    extrude(amount=-CUT_EXTRUDE11_DEPTH, mode=Mode.SUBTRACT)

    # Sketch31 → Cut-Extrude12 (cut)
    with BuildSketch(Plane(origin=(0, 3.75, 0), x_dir=(1, 0, 0), z_dir=(0, 1, 0))):
        with Locations(Location((-36.25, -31, 0), (0, 0, 270))):
            Circle(SKETCH31_R)
        with Locations(Location((-36.25, 13, 0), (0, 0, 270))):
            Circle(SKETCH31_R)
    extrude(amount=-CUT_EXTRUDE12_DEPTH, mode=Mode.SUBTRACT)


solid = part_3.part
